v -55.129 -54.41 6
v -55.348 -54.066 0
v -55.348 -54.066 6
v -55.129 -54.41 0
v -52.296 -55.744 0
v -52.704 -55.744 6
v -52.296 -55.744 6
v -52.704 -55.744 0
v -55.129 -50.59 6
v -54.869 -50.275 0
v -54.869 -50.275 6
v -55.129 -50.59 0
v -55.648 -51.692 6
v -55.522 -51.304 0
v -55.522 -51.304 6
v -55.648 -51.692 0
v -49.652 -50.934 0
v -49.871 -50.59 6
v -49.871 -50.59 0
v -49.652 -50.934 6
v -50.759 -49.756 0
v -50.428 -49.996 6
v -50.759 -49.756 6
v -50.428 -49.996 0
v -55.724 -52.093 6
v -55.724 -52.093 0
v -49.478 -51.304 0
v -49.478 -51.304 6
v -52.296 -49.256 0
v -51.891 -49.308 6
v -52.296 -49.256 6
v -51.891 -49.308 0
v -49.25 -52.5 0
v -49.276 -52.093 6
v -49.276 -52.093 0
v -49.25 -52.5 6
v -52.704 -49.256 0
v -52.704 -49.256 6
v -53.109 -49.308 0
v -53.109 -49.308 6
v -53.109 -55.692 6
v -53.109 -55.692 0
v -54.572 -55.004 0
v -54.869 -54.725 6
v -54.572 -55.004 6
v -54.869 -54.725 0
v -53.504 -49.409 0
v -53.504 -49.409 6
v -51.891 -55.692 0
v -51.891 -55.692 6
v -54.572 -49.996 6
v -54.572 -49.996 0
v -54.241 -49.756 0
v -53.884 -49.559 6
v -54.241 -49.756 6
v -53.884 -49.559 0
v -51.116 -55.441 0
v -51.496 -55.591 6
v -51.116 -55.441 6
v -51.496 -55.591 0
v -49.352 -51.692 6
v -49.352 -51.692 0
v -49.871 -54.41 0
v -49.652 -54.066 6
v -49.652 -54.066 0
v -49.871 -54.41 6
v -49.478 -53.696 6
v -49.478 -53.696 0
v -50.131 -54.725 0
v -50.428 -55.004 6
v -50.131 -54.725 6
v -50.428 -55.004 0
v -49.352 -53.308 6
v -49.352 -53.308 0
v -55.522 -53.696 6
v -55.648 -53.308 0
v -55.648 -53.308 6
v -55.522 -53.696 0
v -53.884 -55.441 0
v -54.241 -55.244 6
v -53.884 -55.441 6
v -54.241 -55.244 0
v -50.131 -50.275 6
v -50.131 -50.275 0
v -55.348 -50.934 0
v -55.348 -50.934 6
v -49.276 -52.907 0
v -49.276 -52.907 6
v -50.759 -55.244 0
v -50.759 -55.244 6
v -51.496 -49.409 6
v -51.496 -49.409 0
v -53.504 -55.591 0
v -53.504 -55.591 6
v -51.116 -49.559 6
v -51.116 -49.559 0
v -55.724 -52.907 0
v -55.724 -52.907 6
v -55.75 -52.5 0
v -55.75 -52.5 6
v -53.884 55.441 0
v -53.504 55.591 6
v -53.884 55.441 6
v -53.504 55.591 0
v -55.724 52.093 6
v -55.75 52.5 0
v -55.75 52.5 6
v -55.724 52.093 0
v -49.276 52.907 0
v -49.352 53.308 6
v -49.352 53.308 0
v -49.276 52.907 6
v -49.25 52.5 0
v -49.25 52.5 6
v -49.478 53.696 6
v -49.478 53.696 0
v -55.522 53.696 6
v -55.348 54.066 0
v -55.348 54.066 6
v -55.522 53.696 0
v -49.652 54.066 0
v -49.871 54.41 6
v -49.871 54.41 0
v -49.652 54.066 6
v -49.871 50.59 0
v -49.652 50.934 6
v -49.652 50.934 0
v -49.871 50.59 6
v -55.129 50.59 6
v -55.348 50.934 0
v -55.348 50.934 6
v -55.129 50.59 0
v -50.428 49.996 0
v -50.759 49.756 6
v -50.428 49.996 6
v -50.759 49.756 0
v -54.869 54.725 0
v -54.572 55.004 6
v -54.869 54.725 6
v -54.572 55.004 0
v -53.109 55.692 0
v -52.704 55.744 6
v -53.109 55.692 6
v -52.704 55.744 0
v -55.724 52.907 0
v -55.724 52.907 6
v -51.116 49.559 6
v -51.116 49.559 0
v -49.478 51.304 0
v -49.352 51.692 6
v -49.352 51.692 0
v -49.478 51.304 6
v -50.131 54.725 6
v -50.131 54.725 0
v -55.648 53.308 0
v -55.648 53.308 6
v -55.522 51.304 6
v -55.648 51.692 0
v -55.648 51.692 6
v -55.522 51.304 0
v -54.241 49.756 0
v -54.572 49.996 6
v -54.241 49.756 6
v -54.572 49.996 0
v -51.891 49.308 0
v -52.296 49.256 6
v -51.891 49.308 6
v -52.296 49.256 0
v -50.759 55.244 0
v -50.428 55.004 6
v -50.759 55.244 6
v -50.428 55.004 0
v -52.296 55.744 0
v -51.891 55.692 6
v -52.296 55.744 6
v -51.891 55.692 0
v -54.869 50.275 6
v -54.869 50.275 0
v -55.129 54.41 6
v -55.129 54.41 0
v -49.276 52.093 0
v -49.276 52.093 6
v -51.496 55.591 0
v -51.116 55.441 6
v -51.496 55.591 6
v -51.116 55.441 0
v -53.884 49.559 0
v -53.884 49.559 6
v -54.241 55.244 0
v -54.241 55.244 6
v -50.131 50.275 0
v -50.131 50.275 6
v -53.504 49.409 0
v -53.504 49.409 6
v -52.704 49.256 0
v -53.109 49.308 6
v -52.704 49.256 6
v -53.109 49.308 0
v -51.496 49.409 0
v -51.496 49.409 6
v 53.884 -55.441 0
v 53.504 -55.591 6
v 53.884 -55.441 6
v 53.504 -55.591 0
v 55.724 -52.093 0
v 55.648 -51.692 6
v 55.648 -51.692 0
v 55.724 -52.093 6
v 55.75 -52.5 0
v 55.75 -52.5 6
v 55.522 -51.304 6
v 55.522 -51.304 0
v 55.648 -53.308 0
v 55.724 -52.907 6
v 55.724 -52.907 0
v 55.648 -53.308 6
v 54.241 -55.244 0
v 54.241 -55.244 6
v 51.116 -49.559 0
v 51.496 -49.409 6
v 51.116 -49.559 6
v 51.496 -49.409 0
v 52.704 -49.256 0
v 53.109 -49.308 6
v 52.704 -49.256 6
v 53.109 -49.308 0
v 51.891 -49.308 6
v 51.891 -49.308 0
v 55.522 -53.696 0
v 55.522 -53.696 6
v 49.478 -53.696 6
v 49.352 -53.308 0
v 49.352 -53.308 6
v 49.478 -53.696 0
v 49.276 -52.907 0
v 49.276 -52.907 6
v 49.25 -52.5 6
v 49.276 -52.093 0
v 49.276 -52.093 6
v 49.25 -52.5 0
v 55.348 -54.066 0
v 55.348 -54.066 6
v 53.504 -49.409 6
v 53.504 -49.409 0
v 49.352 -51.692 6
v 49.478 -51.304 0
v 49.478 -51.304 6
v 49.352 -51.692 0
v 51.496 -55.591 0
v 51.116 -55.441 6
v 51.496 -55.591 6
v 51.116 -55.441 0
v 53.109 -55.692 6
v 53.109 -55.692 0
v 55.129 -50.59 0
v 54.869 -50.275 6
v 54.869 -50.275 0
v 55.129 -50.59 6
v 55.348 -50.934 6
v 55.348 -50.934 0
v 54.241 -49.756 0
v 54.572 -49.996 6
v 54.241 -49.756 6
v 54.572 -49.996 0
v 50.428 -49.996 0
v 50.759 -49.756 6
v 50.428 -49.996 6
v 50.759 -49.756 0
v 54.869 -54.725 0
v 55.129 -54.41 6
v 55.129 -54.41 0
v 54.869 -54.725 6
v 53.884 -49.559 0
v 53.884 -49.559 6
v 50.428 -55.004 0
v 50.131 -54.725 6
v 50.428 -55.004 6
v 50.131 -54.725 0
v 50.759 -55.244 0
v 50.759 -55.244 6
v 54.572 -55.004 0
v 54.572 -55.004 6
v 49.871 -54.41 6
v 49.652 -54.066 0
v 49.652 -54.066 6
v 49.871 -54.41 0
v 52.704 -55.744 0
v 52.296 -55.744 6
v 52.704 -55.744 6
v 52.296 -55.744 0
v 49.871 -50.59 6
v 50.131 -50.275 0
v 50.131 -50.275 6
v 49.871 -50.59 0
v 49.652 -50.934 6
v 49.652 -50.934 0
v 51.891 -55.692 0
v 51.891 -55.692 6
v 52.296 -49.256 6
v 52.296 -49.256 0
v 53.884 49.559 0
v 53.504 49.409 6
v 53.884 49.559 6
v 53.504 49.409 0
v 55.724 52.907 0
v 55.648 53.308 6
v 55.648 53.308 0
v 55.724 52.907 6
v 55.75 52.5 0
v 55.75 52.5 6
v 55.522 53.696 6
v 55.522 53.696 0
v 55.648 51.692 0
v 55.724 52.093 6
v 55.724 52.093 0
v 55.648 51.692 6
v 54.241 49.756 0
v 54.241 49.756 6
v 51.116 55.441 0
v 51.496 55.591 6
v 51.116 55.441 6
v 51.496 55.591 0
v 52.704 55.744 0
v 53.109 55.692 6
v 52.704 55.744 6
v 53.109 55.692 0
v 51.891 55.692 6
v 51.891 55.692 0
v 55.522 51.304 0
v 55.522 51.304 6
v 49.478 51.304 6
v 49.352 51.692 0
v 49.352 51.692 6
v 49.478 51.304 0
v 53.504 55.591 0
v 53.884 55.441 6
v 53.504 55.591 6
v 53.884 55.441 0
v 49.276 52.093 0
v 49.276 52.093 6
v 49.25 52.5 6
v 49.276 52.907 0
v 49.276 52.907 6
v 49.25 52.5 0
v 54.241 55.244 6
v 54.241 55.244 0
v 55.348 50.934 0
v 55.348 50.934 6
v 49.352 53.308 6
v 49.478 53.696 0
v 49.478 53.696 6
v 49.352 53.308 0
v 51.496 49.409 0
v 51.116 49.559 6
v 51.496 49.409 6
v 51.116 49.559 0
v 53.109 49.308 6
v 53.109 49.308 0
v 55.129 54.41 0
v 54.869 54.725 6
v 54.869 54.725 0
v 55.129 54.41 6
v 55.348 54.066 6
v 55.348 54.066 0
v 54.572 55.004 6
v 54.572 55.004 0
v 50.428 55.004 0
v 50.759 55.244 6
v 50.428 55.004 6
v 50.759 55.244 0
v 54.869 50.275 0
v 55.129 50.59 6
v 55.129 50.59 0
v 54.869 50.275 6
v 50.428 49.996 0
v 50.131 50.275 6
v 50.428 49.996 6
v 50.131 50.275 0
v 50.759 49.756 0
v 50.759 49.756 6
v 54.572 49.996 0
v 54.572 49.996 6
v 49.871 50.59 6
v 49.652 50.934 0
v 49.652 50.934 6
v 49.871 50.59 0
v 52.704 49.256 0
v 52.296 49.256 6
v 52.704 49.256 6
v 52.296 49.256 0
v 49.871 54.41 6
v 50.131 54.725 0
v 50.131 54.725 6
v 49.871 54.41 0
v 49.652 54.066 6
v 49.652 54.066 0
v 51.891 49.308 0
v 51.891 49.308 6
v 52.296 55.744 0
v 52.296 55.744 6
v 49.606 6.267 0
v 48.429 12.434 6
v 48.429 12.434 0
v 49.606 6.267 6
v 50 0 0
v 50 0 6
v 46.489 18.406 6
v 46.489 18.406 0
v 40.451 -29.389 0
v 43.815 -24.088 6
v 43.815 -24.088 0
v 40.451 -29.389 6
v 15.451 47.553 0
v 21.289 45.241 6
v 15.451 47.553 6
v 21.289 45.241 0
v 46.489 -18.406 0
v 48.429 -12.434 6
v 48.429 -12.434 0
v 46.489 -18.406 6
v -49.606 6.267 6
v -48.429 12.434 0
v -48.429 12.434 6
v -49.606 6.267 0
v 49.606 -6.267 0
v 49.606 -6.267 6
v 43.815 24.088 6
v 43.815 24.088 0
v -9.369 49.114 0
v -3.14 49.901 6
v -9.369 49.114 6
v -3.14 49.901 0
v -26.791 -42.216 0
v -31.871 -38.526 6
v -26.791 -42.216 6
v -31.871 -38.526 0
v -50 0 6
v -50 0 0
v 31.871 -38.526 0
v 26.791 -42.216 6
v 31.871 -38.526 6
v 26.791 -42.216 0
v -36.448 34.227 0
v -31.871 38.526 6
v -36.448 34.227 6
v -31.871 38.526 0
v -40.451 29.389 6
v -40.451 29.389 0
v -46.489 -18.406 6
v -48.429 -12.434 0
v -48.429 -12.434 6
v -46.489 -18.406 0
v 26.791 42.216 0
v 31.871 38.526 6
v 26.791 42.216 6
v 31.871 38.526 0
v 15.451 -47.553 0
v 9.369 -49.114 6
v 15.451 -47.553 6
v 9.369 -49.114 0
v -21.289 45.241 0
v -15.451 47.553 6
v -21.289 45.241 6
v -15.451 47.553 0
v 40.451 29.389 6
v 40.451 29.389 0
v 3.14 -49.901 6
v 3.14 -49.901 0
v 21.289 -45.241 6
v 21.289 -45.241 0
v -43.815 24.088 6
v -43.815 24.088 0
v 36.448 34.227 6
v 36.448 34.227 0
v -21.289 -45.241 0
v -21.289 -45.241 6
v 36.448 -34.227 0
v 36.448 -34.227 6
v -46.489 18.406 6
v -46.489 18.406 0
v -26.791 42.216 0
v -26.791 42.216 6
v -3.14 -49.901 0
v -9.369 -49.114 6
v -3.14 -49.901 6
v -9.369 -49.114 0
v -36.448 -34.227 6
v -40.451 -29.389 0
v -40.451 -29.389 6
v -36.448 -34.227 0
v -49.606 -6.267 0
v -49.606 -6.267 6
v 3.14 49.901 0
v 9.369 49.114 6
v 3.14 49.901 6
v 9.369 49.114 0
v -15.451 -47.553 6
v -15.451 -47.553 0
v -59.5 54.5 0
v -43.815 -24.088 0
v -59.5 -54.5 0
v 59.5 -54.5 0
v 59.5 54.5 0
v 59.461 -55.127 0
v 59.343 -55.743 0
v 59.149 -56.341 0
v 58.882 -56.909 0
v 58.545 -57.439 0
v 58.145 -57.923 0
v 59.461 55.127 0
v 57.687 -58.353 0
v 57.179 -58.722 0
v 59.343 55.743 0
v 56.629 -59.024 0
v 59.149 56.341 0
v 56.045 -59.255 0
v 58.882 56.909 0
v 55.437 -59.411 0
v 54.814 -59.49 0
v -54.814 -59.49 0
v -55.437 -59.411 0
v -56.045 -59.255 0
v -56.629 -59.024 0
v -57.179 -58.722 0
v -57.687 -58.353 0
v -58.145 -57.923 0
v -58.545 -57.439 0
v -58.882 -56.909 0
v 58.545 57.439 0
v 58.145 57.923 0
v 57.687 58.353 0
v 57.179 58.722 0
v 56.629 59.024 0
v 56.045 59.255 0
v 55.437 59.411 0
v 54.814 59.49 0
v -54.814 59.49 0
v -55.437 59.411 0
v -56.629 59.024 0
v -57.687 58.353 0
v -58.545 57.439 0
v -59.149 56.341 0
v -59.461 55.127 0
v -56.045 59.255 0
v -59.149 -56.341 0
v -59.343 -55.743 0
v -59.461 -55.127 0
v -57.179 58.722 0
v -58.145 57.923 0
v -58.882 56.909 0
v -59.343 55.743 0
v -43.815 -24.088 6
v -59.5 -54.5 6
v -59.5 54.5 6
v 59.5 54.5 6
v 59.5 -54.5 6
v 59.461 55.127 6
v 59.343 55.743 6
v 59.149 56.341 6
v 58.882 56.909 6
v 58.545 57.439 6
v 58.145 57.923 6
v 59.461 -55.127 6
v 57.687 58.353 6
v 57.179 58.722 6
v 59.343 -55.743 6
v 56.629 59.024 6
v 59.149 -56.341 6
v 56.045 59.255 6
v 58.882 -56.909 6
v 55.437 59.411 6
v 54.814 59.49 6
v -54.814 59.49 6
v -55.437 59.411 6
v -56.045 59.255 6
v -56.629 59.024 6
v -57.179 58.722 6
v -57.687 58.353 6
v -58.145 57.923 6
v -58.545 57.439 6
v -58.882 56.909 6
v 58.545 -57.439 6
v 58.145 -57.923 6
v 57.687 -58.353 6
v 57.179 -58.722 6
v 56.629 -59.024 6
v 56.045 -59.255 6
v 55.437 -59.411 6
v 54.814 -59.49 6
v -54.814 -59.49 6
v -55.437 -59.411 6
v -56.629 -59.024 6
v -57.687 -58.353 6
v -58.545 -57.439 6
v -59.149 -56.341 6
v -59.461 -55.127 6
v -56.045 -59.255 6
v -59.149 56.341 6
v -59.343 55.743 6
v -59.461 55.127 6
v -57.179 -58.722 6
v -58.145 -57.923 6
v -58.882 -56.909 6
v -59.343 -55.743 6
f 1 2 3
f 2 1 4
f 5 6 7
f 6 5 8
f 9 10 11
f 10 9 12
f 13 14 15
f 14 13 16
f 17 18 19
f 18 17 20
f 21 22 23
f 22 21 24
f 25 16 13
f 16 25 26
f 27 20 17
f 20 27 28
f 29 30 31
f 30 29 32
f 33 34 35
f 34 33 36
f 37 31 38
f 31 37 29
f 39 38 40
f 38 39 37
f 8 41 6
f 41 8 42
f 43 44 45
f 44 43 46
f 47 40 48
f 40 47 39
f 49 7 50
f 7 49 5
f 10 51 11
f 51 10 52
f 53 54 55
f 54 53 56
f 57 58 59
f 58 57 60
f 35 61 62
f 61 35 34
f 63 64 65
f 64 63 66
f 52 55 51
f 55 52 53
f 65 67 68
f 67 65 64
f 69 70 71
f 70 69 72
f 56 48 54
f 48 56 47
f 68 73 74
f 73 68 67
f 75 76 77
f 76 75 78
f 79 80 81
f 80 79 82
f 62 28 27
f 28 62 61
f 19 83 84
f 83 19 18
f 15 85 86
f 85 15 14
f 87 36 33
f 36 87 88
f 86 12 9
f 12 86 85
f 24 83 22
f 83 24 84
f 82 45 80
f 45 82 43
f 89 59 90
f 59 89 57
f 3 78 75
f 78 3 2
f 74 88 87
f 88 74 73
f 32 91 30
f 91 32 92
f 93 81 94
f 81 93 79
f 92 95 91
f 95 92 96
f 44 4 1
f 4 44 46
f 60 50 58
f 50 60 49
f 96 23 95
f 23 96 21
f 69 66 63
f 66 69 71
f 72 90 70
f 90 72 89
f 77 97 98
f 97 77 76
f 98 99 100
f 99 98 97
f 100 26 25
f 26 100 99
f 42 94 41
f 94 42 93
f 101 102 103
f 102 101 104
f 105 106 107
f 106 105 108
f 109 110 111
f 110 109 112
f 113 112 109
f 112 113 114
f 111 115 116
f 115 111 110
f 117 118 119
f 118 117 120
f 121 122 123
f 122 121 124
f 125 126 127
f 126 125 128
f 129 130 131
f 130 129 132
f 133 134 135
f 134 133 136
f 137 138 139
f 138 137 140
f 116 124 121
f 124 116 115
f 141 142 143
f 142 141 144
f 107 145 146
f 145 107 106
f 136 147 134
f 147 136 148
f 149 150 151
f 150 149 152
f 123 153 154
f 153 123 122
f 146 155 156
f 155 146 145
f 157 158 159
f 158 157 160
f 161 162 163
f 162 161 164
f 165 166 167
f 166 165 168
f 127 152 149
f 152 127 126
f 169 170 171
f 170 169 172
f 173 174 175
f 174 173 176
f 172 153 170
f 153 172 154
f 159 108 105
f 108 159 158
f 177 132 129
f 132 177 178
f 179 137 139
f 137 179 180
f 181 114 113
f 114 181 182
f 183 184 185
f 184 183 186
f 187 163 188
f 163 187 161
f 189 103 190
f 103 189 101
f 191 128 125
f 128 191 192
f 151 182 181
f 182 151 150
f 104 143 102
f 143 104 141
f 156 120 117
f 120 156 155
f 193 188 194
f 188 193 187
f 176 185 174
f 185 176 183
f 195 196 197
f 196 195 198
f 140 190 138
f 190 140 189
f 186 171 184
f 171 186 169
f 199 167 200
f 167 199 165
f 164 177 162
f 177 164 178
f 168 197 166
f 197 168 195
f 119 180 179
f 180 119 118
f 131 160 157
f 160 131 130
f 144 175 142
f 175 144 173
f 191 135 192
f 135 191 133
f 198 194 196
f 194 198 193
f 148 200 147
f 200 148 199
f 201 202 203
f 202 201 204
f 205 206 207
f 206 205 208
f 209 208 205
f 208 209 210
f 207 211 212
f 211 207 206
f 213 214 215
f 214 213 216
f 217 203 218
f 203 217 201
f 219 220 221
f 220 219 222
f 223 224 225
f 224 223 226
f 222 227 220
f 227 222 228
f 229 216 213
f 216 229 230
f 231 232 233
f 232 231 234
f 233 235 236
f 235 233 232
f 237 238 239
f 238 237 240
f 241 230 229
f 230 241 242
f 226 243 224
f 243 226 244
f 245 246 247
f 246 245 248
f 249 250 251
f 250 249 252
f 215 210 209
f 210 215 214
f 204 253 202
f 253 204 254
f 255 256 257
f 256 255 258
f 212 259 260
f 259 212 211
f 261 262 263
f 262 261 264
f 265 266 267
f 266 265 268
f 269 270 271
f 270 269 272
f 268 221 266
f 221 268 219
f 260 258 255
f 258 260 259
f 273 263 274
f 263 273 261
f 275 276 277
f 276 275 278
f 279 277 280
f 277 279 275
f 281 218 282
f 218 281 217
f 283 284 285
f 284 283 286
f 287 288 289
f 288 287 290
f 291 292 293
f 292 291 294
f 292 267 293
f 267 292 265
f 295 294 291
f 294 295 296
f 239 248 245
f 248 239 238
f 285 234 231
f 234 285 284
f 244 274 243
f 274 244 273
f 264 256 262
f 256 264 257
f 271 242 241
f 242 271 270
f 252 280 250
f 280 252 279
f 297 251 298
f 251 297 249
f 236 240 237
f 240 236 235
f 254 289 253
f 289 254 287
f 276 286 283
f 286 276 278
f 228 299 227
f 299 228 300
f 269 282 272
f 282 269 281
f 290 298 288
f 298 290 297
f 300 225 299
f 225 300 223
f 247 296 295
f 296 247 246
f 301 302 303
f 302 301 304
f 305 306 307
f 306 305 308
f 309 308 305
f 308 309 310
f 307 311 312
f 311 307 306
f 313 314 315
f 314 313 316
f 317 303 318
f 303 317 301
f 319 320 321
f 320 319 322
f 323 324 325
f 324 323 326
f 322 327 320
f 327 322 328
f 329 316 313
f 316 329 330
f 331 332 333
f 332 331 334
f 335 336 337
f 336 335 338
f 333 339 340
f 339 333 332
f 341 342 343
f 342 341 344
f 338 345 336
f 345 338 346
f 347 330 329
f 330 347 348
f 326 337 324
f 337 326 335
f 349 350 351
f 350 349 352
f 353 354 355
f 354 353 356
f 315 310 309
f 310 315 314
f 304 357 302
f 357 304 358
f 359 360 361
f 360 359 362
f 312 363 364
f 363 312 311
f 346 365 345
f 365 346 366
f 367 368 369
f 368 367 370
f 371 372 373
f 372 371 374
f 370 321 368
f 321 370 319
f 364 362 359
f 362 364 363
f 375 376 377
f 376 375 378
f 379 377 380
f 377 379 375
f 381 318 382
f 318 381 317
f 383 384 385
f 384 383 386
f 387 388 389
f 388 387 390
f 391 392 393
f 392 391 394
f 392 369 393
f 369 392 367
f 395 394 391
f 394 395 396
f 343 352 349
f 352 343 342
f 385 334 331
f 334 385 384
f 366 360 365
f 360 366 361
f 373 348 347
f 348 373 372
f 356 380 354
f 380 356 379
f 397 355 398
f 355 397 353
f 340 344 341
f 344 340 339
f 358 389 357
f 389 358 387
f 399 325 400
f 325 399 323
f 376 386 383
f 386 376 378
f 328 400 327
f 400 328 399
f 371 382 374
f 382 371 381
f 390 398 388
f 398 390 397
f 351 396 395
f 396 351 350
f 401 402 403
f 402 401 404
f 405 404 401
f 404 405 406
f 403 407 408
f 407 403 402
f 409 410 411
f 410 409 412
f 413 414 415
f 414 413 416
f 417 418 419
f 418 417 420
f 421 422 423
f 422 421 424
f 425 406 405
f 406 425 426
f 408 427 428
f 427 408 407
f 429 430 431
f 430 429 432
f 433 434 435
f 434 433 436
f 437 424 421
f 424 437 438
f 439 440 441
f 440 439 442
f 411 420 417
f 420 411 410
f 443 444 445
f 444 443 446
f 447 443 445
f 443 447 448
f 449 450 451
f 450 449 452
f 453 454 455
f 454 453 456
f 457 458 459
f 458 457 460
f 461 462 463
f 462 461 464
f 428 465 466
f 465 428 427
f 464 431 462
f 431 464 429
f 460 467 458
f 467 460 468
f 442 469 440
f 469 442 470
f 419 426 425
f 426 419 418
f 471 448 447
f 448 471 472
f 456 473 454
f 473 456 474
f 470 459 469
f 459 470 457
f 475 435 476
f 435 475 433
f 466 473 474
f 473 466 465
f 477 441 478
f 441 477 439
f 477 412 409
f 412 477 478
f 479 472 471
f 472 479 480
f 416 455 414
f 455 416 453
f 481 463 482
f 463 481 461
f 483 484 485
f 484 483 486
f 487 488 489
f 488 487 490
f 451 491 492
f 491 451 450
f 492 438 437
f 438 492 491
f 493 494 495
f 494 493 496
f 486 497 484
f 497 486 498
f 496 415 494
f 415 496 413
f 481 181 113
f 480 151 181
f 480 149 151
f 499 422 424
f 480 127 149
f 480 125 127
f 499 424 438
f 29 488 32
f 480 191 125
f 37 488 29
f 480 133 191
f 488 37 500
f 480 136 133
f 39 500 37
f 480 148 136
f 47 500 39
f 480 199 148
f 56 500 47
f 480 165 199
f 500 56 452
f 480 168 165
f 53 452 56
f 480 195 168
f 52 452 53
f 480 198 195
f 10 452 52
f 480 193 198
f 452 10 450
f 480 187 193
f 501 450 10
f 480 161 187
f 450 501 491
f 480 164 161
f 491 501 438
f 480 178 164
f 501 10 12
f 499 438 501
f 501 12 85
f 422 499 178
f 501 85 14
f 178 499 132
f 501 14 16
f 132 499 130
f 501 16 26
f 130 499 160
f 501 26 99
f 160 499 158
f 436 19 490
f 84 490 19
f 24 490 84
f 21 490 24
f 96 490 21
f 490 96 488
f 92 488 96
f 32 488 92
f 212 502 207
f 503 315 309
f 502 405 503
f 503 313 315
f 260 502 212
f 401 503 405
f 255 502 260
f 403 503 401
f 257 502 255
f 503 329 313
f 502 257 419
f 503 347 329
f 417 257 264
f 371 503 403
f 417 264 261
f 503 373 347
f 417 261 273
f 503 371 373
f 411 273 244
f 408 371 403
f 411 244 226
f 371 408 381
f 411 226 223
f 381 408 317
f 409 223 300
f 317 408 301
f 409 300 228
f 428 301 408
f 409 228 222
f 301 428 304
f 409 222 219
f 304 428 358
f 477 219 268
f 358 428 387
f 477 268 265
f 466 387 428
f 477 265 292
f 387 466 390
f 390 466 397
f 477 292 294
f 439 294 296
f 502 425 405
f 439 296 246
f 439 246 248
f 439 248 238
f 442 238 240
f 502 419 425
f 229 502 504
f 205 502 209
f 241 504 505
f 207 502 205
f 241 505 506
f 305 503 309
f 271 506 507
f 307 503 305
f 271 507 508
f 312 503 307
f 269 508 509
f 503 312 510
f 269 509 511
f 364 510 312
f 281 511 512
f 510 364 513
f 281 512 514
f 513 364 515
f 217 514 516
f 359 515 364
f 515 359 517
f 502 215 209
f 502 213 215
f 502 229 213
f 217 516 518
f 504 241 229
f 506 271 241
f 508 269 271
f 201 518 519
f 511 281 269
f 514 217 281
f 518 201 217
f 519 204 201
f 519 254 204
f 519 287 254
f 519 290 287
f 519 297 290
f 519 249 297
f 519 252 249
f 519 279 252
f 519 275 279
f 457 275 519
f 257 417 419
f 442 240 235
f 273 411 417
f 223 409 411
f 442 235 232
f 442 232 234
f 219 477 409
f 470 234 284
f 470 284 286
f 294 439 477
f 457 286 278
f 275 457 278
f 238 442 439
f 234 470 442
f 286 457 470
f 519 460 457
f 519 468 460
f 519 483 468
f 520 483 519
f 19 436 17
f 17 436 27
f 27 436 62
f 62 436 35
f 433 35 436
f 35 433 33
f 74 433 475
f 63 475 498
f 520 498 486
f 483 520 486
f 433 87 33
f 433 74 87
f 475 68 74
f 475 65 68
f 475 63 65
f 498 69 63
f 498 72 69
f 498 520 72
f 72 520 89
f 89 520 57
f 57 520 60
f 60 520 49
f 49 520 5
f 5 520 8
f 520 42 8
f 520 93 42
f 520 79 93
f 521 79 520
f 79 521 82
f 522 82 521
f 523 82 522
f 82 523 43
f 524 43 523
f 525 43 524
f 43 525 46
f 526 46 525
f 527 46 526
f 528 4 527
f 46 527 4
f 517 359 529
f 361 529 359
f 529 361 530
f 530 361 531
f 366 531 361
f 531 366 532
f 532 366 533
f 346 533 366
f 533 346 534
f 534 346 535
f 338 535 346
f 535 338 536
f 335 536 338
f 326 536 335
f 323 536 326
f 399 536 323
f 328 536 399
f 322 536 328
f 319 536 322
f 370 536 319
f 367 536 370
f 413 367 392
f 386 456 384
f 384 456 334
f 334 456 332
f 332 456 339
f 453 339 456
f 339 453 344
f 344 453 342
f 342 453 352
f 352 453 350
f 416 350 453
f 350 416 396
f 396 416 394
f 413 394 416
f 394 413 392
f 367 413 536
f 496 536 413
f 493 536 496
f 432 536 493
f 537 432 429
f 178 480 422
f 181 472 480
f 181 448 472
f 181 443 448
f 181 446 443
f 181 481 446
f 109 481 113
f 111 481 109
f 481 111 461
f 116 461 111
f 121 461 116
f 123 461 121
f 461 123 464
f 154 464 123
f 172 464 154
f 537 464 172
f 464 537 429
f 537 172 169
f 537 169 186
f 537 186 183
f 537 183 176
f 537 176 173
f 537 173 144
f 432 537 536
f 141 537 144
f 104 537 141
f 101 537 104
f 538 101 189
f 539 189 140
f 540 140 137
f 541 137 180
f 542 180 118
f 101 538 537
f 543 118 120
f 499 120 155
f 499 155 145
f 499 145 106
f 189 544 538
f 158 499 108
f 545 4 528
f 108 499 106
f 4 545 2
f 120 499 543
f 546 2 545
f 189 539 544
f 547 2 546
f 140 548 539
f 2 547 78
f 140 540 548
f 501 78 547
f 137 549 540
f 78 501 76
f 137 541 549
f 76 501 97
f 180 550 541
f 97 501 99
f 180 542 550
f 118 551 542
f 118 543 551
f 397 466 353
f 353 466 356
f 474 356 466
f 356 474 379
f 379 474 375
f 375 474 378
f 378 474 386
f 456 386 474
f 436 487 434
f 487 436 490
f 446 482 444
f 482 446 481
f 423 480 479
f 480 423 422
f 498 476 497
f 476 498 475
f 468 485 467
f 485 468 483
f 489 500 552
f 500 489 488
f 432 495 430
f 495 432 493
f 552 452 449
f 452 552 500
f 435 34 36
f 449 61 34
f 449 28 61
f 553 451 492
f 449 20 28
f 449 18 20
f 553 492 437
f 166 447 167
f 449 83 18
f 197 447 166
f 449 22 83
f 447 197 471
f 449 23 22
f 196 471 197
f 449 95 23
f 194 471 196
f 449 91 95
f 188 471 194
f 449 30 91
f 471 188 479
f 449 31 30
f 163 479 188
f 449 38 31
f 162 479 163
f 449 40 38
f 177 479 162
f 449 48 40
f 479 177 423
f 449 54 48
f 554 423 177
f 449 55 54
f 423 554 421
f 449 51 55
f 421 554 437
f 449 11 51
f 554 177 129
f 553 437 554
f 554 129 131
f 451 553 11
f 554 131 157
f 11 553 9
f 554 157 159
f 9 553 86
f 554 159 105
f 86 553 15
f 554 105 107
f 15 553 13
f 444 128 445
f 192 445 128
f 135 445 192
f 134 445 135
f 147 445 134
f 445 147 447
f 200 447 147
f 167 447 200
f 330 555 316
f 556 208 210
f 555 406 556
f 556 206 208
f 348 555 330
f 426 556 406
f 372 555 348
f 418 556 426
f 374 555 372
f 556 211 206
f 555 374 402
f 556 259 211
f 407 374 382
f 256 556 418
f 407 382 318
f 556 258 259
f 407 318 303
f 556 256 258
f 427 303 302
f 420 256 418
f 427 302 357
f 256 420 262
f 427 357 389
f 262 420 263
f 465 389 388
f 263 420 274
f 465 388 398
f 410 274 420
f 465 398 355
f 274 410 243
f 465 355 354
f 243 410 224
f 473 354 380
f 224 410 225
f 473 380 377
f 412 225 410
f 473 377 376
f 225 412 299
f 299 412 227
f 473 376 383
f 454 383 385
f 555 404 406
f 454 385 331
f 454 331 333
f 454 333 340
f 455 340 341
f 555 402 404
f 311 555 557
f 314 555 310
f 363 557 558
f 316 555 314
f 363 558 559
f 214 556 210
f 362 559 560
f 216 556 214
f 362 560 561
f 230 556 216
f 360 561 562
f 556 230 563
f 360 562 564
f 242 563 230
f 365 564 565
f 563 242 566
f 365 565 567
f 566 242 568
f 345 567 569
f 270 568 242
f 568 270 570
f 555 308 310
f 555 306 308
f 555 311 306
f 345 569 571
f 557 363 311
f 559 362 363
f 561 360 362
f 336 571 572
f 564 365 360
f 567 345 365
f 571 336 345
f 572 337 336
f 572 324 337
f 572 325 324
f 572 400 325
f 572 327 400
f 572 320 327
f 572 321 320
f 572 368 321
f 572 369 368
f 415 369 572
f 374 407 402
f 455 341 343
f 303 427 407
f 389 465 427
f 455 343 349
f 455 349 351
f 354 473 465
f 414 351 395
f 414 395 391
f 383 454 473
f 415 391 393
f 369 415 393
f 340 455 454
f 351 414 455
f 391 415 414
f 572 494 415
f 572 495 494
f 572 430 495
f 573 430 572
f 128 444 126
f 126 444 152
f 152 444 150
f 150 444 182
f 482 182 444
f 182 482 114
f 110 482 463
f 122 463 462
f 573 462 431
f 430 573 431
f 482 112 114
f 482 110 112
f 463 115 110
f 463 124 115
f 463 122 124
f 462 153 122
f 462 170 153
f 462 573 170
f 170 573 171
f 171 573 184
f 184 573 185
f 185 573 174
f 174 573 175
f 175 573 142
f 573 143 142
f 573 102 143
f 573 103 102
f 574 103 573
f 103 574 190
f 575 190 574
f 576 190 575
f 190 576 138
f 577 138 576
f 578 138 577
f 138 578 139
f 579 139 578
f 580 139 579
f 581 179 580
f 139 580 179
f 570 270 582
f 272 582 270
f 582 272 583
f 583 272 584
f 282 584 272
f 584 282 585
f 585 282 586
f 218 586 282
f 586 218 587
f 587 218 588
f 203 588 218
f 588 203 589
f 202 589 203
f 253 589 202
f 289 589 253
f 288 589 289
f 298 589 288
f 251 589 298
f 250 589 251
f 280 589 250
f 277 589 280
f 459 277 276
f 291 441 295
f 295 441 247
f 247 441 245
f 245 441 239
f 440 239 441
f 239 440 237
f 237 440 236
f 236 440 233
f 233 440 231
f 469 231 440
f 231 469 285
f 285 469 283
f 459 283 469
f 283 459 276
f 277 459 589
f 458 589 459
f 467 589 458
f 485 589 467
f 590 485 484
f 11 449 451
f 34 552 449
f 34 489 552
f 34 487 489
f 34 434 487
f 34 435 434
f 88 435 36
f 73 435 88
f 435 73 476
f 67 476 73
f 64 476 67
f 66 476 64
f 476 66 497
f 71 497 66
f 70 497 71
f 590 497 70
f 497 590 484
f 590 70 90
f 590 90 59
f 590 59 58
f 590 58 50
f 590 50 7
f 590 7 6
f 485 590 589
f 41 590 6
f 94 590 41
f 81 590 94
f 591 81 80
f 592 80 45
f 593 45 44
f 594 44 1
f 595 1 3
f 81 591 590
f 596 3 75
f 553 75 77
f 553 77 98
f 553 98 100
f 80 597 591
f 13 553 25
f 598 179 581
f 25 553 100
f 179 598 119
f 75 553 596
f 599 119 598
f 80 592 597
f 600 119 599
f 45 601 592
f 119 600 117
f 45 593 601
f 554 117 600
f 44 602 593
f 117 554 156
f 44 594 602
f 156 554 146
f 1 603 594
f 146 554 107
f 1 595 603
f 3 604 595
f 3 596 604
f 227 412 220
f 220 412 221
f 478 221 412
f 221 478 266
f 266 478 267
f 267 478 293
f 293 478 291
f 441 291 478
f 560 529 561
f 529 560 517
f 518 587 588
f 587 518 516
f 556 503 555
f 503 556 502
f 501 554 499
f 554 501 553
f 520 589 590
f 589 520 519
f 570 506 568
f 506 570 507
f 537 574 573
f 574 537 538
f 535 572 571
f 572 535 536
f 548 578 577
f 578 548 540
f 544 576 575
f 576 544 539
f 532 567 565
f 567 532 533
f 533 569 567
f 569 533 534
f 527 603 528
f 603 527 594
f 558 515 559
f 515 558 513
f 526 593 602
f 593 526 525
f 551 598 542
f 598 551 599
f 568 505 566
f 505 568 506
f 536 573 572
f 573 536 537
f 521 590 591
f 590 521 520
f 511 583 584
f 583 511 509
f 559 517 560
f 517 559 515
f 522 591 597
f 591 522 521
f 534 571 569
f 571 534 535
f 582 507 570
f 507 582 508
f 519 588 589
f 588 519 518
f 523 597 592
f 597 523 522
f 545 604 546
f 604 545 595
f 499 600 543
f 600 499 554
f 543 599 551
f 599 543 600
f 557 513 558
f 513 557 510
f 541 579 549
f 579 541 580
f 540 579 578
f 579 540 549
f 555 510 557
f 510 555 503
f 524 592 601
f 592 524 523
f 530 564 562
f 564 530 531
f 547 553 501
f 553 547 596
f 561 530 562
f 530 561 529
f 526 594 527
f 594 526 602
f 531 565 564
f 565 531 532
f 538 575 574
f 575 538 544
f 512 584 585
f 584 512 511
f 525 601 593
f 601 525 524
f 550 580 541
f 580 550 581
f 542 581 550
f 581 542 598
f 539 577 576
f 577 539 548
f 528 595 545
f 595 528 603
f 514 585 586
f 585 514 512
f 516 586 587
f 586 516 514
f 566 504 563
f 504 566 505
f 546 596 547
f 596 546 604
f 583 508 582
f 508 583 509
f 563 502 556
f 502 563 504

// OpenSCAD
$fn = 50;


difference() {
	union() {
		hull() {
			translate(v = [-54.5000000000, 54.5000000000, 0]) {
				cylinder(h = 6, r = 5);
			}
			translate(v = [54.5000000000, 54.5000000000, 0]) {
				cylinder(h = 6, r = 5);
			}
			translate(v = [-54.5000000000, -54.5000000000, 0]) {
				cylinder(h = 6, r = 5);
			}
			translate(v = [54.5000000000, -54.5000000000, 0]) {
				cylinder(h = 6, r = 5);
			}
		}
	}
	union() {
		#translate(v = [-52.5000000000, -52.5000000000, -100.0000000000]) {
			cylinder(h = 200, r = 3.2500000000);
		}
		#translate(v = [-52.5000000000, 52.5000000000, -100.0000000000]) {
			cylinder(h = 200, r = 3.2500000000);
		}
		#translate(v = [52.5000000000, -52.5000000000, -100.0000000000]) {
			cylinder(h = 200, r = 3.2500000000);
		}
		#translate(v = [52.5000000000, 52.5000000000, -100.0000000000]) {
			cylinder(h = 200, r = 3.2500000000);
		}
		#cylinder(h = 6, r = 50.0000000000);
	}
}
